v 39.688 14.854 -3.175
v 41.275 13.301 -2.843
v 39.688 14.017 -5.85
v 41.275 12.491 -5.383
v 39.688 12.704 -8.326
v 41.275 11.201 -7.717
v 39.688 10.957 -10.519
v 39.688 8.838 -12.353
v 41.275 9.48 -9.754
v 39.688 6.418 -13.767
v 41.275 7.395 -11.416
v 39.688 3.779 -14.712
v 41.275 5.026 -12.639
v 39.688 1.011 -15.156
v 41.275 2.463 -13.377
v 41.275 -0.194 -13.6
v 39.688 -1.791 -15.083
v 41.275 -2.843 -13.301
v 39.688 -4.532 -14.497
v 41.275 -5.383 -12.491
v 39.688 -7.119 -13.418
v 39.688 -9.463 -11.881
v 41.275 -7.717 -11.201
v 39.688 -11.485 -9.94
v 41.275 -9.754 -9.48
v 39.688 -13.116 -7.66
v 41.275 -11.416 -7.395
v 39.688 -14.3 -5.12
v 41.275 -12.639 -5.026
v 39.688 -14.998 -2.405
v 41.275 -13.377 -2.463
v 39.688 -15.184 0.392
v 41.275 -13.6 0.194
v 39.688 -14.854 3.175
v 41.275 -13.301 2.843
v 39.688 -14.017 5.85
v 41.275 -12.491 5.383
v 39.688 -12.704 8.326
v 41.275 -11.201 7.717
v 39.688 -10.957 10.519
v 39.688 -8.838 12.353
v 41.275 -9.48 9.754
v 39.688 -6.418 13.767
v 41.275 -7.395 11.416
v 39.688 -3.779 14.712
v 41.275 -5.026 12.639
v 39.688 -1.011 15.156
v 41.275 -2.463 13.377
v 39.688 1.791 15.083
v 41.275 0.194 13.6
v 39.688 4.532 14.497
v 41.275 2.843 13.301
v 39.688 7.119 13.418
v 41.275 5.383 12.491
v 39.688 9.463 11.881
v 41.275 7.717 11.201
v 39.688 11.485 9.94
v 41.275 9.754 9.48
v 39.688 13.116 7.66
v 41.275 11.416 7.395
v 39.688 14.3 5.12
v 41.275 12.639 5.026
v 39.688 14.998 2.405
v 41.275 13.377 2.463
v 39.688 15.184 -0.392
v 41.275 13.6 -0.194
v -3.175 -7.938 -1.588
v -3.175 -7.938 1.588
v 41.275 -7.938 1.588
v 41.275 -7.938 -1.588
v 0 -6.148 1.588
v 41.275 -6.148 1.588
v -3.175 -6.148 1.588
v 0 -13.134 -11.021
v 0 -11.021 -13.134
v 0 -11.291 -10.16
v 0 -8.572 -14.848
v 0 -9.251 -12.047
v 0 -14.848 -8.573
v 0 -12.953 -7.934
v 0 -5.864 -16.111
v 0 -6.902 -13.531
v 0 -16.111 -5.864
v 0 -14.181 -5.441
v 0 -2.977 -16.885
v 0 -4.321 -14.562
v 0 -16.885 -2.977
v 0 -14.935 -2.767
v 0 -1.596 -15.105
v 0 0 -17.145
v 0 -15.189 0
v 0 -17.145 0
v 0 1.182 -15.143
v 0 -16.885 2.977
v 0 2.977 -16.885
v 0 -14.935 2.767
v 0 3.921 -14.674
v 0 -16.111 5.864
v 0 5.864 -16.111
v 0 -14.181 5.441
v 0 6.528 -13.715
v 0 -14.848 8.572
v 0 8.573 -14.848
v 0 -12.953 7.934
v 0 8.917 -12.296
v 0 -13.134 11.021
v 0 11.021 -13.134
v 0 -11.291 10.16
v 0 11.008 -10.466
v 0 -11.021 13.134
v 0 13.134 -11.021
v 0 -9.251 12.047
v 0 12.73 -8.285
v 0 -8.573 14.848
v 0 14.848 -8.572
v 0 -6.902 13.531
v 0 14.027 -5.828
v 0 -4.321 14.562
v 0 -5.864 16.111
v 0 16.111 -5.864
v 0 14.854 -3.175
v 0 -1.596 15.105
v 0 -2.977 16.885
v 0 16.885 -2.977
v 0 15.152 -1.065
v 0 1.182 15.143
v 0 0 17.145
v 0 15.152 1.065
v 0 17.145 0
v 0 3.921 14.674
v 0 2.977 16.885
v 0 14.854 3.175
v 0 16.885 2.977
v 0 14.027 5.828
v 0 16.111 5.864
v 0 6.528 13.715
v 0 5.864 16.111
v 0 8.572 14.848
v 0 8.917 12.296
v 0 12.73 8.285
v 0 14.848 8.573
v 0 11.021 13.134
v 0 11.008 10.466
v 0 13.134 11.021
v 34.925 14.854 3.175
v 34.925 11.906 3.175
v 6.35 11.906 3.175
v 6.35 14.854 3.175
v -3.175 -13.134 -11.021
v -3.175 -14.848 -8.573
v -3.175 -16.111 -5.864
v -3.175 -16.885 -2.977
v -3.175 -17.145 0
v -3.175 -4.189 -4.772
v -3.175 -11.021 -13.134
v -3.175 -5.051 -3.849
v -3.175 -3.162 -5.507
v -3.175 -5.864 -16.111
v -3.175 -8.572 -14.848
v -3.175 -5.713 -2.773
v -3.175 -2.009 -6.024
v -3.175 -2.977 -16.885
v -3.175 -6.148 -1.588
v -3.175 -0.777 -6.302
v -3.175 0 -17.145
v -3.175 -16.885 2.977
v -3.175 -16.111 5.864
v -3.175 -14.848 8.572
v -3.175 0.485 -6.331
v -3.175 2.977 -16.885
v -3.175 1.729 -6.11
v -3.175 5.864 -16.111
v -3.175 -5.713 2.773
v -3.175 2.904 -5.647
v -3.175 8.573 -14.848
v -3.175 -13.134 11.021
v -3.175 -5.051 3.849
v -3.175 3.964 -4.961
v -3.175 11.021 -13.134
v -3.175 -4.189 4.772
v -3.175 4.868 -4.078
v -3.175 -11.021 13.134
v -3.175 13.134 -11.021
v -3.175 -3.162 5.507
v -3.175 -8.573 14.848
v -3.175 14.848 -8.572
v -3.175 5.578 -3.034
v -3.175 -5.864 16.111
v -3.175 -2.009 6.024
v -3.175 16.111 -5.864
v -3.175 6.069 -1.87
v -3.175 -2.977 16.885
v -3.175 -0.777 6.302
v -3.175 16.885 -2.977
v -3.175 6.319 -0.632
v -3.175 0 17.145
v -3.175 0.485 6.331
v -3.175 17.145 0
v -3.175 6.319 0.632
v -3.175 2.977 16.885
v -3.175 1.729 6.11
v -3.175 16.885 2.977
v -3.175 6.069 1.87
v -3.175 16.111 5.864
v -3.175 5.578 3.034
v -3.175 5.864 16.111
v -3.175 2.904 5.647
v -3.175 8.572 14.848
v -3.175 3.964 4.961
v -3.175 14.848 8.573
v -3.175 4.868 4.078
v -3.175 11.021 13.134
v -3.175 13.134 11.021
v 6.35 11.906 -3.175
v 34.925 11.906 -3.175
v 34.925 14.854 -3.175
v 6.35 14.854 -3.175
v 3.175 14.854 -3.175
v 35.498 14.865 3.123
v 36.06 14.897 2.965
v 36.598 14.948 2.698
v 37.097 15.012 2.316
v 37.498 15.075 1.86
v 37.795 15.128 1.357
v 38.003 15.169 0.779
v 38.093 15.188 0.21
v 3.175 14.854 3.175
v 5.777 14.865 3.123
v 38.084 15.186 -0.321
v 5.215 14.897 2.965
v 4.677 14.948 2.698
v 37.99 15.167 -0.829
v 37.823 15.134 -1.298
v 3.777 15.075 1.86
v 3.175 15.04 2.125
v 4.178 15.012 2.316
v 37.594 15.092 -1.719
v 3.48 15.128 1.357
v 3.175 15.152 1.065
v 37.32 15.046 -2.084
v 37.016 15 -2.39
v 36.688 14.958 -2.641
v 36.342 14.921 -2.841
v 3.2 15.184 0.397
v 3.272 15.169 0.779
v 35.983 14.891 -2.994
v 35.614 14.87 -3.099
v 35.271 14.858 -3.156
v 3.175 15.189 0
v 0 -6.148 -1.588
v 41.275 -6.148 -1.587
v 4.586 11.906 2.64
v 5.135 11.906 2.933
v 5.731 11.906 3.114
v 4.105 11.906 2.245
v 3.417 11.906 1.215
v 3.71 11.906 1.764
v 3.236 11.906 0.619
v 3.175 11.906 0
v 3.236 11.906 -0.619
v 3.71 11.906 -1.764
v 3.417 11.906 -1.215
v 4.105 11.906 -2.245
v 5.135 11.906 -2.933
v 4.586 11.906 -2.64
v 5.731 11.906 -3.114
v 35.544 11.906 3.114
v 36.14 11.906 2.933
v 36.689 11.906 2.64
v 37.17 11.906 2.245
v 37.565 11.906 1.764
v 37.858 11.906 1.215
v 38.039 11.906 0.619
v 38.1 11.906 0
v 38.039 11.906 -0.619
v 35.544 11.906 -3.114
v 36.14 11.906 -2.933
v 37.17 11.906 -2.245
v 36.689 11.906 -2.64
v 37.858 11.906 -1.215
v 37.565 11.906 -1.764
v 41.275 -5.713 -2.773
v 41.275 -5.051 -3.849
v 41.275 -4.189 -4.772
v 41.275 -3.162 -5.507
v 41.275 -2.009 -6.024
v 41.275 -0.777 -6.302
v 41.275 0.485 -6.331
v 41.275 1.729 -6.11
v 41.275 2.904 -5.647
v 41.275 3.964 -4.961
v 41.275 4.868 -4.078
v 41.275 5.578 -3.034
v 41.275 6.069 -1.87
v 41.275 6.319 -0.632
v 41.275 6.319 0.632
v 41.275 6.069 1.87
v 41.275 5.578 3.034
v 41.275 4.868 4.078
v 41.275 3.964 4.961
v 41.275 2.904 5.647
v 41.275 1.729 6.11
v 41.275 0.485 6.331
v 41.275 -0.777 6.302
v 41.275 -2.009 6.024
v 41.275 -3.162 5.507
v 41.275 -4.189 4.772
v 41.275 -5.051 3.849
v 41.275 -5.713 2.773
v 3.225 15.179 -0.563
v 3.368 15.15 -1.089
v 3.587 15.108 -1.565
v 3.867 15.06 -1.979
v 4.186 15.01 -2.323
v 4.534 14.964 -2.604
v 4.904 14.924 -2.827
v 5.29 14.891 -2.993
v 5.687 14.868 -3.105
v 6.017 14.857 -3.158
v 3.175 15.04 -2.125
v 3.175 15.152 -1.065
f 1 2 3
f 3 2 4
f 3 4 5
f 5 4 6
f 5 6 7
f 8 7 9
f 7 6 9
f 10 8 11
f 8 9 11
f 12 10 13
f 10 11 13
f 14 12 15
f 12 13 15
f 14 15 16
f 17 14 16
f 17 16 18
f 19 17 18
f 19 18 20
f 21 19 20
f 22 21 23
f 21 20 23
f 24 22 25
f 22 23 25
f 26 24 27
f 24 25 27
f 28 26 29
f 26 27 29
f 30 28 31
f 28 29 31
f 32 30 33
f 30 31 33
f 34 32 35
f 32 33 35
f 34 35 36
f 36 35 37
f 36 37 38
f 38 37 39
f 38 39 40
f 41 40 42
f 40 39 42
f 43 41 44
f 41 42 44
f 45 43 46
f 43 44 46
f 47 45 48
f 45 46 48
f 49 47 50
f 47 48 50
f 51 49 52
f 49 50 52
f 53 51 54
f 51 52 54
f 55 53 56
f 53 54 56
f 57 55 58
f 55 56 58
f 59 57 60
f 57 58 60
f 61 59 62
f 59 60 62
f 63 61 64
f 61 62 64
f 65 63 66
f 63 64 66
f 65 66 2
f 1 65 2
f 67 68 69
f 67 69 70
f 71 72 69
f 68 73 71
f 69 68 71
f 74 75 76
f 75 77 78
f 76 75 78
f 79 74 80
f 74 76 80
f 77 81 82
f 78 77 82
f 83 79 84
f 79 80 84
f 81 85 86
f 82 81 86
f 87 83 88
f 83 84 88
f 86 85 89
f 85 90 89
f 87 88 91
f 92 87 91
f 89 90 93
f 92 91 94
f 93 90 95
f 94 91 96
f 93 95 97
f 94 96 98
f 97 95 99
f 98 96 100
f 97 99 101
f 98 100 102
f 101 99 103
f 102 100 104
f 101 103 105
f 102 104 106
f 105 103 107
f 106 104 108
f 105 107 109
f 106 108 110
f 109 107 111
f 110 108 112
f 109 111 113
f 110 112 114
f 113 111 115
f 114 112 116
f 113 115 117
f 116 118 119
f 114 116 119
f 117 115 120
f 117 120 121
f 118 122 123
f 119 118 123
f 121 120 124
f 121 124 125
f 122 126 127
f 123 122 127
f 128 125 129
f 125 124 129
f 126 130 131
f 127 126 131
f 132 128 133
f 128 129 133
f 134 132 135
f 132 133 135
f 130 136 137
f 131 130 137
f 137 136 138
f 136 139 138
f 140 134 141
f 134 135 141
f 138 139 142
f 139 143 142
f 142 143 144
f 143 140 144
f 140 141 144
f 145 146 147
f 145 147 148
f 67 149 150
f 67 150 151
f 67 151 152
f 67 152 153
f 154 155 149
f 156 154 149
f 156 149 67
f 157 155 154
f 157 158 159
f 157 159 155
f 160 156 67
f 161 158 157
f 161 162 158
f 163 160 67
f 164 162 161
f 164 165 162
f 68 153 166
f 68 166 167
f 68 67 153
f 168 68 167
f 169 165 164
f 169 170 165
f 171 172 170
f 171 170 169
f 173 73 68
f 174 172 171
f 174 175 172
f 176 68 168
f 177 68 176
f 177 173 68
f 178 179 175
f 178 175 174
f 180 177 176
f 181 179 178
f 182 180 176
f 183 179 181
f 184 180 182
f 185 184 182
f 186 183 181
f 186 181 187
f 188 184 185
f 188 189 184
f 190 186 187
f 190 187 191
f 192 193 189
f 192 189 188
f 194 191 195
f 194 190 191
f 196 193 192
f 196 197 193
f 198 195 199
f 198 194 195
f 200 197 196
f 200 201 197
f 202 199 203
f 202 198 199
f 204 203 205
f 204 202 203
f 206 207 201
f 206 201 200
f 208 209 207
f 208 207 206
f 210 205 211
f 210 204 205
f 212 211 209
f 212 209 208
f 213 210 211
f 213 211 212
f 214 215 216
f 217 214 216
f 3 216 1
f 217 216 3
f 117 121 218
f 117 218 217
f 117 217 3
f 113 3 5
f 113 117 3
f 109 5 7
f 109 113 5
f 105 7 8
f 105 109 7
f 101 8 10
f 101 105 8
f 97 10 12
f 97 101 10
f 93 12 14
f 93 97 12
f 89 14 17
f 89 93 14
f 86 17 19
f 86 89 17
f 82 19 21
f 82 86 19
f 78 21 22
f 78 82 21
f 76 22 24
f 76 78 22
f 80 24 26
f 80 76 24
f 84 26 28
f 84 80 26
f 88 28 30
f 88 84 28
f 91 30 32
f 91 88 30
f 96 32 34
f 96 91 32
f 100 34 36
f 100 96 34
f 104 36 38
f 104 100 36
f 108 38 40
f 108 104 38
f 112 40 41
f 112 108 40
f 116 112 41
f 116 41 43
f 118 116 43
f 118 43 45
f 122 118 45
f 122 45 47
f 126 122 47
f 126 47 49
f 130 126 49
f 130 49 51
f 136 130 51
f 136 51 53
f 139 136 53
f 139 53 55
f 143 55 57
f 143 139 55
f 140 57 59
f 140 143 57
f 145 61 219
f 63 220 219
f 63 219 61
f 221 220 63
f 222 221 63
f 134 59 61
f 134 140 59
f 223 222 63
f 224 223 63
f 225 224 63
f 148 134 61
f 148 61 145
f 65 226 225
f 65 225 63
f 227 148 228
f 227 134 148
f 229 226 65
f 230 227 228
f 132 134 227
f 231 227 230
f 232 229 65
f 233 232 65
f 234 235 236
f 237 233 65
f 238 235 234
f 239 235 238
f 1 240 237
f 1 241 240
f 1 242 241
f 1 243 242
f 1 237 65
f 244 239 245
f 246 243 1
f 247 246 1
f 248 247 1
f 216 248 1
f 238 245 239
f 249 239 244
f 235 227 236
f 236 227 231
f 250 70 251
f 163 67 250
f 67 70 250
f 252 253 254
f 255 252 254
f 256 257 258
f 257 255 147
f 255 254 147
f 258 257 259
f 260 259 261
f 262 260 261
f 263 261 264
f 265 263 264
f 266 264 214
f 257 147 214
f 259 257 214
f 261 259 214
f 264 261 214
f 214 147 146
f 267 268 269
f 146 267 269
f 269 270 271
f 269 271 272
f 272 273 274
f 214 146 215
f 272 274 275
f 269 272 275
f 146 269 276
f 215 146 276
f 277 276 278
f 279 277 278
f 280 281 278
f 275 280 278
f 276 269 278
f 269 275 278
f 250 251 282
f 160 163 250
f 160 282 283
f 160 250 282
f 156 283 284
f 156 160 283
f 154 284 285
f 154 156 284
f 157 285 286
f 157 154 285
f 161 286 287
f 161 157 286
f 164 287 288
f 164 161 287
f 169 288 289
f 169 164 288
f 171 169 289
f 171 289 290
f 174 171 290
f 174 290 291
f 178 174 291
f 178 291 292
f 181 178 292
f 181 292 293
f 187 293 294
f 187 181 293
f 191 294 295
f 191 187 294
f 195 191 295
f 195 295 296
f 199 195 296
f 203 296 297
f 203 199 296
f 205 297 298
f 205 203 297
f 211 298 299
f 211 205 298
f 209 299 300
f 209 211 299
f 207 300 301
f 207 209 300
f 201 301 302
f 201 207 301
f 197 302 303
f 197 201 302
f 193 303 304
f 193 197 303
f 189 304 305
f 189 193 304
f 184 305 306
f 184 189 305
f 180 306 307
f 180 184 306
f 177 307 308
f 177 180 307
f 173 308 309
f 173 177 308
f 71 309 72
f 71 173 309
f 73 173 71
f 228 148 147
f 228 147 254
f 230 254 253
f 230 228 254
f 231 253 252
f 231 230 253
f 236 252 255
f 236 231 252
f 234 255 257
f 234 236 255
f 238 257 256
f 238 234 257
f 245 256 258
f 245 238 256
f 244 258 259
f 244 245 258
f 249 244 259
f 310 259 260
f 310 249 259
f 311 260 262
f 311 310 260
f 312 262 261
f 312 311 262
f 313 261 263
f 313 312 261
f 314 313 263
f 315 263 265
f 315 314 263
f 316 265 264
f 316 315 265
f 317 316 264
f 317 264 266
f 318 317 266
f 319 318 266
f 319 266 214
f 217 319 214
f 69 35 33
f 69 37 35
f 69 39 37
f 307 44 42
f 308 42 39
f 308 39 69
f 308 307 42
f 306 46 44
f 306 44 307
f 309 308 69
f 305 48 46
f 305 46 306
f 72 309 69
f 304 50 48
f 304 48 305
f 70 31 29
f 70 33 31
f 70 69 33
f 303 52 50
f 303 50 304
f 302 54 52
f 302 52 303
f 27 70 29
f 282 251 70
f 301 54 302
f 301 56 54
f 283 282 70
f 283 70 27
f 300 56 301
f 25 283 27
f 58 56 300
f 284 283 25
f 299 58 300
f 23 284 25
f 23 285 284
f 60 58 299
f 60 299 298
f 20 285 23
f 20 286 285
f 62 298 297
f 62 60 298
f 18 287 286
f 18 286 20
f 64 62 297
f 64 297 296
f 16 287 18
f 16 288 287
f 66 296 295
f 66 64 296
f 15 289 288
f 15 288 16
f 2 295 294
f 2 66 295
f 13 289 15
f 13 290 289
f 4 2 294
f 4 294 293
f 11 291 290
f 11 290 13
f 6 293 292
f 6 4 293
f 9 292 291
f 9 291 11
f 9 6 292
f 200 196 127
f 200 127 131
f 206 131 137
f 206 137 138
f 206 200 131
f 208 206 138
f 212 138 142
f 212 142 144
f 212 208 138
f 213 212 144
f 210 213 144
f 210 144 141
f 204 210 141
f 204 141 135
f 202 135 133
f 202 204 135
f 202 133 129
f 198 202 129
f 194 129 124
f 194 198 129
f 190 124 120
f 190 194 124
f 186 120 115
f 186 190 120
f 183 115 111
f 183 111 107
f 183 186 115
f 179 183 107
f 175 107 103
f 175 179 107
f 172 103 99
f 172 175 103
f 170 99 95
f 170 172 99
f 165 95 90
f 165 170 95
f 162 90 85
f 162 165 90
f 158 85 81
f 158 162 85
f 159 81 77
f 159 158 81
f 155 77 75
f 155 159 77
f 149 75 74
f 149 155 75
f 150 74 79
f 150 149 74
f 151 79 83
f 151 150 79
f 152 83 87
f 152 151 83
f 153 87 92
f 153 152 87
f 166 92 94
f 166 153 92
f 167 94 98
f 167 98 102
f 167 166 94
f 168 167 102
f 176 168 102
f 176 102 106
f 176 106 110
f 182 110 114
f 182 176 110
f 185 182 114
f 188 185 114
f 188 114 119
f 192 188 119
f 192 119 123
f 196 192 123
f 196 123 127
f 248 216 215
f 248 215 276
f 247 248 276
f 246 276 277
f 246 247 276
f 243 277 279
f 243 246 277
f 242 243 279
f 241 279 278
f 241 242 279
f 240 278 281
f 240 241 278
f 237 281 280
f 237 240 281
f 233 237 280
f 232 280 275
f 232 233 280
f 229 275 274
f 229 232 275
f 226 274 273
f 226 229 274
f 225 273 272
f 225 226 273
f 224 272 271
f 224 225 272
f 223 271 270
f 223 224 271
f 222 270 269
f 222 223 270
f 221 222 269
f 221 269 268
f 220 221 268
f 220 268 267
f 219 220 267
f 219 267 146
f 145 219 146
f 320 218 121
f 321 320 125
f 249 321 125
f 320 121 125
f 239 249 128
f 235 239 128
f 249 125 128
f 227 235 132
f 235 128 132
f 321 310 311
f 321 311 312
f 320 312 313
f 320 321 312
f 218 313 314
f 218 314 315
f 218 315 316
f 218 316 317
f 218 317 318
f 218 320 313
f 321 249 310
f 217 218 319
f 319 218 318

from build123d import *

# Parameters (mm, degrees)
SKETCH1_R           = 15.1892
SKETCH1_R_2         = 6.35
BOSS_EXTRUDE1_DEPTH = 41.275
SKETCH2_W           = 3.175
SKETCH2_H           = 3.175
SKETCH2_W_2         = 6.35
SKETCH2_H_2         = 6.35
CUT_EXTRUDE1_DEPTH  = 47.530089
BOSS_EXTRUDE2_START = 3.175
SKETCH3_R           = 17.145
BOSS_EXTRUDE2_DEPTH = 3.175
BOSS_EXTRUDE3_DEPTH = 3.175
BOSS_EXTRUDE4_START = -3.175
SKETCH5_R           = 15.1892
SKETCH5_R_2         = 10.967899
BOSS_EXTRUDE4_DEPTH = 3.175
FILLET1_R           = 3.175
CHAMFER1_SIZE       = 1.5875


with BuildPart() as part:
    # Sketch1 → Boss-Extrude1 (new body)
    with BuildSketch(Plane(origin=(0, 0, 0), x_dir=(0, 0, -1), z_dir=(1, 0, 0))):
        Circle(SKETCH1_R)
        Circle(SKETCH1_R_2, mode=Mode.SUBTRACT)
    extrude(amount=BOSS_EXTRUDE1_DEPTH)

    # Sketch2 → Cut-Extrude1 (cut, through all)
    with BuildSketch(Plane(origin=(41.275, 0, 0), x_dir=(0, 0, -1), z_dir=(1, 0, 0))):
        with Locations((0, -6.35)):
            Rectangle(SKETCH2_W, SKETCH2_H)
        with Locations((0, 15.08125)):
            Rectangle(SKETCH2_W_2, SKETCH2_H_2)
    extrude(amount=-CUT_EXTRUDE1_DEPTH, mode=Mode.SUBTRACT)

    # Sketch3 → Boss-Extrude2 (add)
    # profile 1 of 2: a face of its own
    with BuildSketch(Plane.ZY.offset(BOSS_EXTRUDE2_START)):
        Circle(SKETCH3_R)
        with BuildLine():
            Line((-3.175, 11.90625), (3.175, 11.90625))
            Line((3.175, 11.90625), (3.175, 14.853659))
            ThreePointArc((3.175, 14.853659), (0, -15.1892), (-3.175, 14.853659))
            Line((-3.175, 14.853659), (-3.175, 11.90625))
        make_face(mode=Mode.SUBTRACT)
    # profile 2 of 2: a face of its own
    with BuildSketch(Plane.ZY.offset(BOSS_EXTRUDE2_START)):
        with BuildLine():
            Line((3.175, 14.853659), (3.175, 11.90625))
            Line((3.175, 11.90625), (-3.175, 11.90625))
            Line((-3.175, 11.90625), (-3.175, 14.853659))
            ThreePointArc((-3.175, 14.853659), (0, -15.1892), (3.175, 14.853659))
        make_face()
        with BuildLine():
            Line((-1.5875, -7.9375), (-1.5875, -6.148361))
            ThreePointArc((-1.5875, -6.148361), (0, 6.35), (1.5875, -6.148361))
            Line((1.5875, -6.148361), (1.5875, -7.9375))
            Line((1.5875, -7.9375), (-1.5875, -7.9375))
        make_face(mode=Mode.SUBTRACT)
    extrude(amount=-BOSS_EXTRUDE2_DEPTH)

    # Sketch4 → Boss-Extrude3 (add)
    with BuildSketch(Plane(origin=(0, 0, 0), x_dir=(0, 0, -1), z_dir=(1, 0, 0))):
        with BuildLine():
            ThreePointArc((3.175, 14.853659), (0, 15.1892), (-3.175, 14.853659))
            Line((-3.175, 14.853659), (-3.175, 11.90625))
            Line((-3.175, 11.90625), (3.175, 11.90625))
            Line((3.175, 11.90625), (3.175, 14.827684))
            Line((3.175, 14.827684), (3.175, 14.853659))
        make_face()
    extrude(amount=BOSS_EXTRUDE3_DEPTH)

    # Sketch5 → Boss-Extrude4 (add)
    with BuildSketch(Plane(origin=(41.275, 0, 0), x_dir=(0, 0, -1), z_dir=(1, 0, 0)).offset(BOSS_EXTRUDE4_START)):
        Circle(SKETCH5_R)
        Circle(SKETCH5_R_2, mode=Mode.SUBTRACT)
    extrude(amount=BOSS_EXTRUDE4_DEPTH)

    # Fillet1
    # the kernel refuses this fillet: 3.175 mm, written as the material it adds along each edge
    with BuildSketch(Plane(origin=(3.175, 22.791159, -3.175), x_dir=(1, 0, 0), z_dir=(0, -1, 0))) as fillet1_piece_1_section:
        with BuildLine():
            CenterArc((FILLET1_R, FILLET1_R), FILLET1_R, 180, 90)
            Line((0, FILLET1_R), (0, 0))
            Line((0, 0), (FILLET1_R, 0))
        make_face()
    fillet1_piece_1 = extrude(amount=10.884909, mode=Mode.PRIVATE)
    fillet1_piece_1 = fillet1_piece_1 & Plane(origin=(3.873842, 0, 0), x_dir=(0, 0, -1), z_dir=(-1, 0, 0)) * Cylinder(15.1892, 35, mode=Mode.PRIVATE)
    add(fillet1_piece_1)
    with BuildSketch(Plane(origin=(3.175, 22.791159, 3.175), x_dir=(1, 0, 0), z_dir=(0, -1, 0))) as fillet1_piece_2_section:
        with BuildLine():
            CenterArc((FILLET1_R, -FILLET1_R), FILLET1_R, 90, 90)
            Line((0, -FILLET1_R), (0, 0))
            Line((0, 0), (FILLET1_R, 0))
        make_face()
    fillet1_piece_2 = extrude(amount=10.884909, mode=Mode.PRIVATE)
    fillet1_piece_2 = fillet1_piece_2 & Plane(origin=(3.873846, 0, 0), x_dir=(0, 0, -1), z_dir=(-1, 0, 0)) * Cylinder(15.1892, 35, mode=Mode.PRIVATE)
    add(fillet1_piece_2)
    with BuildSketch(Plane(origin=(38.1, 11.90625, 3.175), x_dir=(0, 0, -1), z_dir=(0, 1, 0))) as fillet1_piece_3_section:
        with BuildLine():
            CenterArc((FILLET1_R, FILLET1_R), FILLET1_R, 180, 90)
            Line((0, FILLET1_R), (0, 0))
            Line((0, 0), (FILLET1_R, 0))
        make_face()
    fillet1_piece_3 = extrude(amount=10.884909, mode=Mode.PRIVATE)
    fillet1_piece_3 = fillet1_piece_3 & Plane(origin=(37.401164, 0, 0), x_dir=(0, 0, -1), z_dir=(-1, 0, 0)) * Cylinder(15.1892, 35, mode=Mode.PRIVATE)
    add(fillet1_piece_3)
    with BuildSketch(Plane(origin=(38.1, 22.791159, -3.175), x_dir=(-1, 0, 0), z_dir=(0, -1, 0))) as fillet1_piece_4_section:
        with BuildLine():
            CenterArc((FILLET1_R, -FILLET1_R), FILLET1_R, 90, 90)
            Line((0, -FILLET1_R), (0, 0))
            Line((0, 0), (FILLET1_R, 0))
        make_face()
    fillet1_piece_4 = extrude(amount=10.884909, mode=Mode.PRIVATE)
    fillet1_piece_4 = fillet1_piece_4 & Plane(origin=(37.401158, 0, 0), x_dir=(0, 0, -1), z_dir=(-1, 0, 0)) * Cylinder(15.1892, 35, mode=Mode.PRIVATE)
    add(fillet1_piece_4)

    # Chamfer1
    chamfer1_edges = [part.edges().sort_by_distance(p)[0] for p in [
        (41.275, -14.853659, 3.175),
    ]]
    chamfer(chamfer1_edges, length=CHAMFER1_SIZE)


solid = part.part
